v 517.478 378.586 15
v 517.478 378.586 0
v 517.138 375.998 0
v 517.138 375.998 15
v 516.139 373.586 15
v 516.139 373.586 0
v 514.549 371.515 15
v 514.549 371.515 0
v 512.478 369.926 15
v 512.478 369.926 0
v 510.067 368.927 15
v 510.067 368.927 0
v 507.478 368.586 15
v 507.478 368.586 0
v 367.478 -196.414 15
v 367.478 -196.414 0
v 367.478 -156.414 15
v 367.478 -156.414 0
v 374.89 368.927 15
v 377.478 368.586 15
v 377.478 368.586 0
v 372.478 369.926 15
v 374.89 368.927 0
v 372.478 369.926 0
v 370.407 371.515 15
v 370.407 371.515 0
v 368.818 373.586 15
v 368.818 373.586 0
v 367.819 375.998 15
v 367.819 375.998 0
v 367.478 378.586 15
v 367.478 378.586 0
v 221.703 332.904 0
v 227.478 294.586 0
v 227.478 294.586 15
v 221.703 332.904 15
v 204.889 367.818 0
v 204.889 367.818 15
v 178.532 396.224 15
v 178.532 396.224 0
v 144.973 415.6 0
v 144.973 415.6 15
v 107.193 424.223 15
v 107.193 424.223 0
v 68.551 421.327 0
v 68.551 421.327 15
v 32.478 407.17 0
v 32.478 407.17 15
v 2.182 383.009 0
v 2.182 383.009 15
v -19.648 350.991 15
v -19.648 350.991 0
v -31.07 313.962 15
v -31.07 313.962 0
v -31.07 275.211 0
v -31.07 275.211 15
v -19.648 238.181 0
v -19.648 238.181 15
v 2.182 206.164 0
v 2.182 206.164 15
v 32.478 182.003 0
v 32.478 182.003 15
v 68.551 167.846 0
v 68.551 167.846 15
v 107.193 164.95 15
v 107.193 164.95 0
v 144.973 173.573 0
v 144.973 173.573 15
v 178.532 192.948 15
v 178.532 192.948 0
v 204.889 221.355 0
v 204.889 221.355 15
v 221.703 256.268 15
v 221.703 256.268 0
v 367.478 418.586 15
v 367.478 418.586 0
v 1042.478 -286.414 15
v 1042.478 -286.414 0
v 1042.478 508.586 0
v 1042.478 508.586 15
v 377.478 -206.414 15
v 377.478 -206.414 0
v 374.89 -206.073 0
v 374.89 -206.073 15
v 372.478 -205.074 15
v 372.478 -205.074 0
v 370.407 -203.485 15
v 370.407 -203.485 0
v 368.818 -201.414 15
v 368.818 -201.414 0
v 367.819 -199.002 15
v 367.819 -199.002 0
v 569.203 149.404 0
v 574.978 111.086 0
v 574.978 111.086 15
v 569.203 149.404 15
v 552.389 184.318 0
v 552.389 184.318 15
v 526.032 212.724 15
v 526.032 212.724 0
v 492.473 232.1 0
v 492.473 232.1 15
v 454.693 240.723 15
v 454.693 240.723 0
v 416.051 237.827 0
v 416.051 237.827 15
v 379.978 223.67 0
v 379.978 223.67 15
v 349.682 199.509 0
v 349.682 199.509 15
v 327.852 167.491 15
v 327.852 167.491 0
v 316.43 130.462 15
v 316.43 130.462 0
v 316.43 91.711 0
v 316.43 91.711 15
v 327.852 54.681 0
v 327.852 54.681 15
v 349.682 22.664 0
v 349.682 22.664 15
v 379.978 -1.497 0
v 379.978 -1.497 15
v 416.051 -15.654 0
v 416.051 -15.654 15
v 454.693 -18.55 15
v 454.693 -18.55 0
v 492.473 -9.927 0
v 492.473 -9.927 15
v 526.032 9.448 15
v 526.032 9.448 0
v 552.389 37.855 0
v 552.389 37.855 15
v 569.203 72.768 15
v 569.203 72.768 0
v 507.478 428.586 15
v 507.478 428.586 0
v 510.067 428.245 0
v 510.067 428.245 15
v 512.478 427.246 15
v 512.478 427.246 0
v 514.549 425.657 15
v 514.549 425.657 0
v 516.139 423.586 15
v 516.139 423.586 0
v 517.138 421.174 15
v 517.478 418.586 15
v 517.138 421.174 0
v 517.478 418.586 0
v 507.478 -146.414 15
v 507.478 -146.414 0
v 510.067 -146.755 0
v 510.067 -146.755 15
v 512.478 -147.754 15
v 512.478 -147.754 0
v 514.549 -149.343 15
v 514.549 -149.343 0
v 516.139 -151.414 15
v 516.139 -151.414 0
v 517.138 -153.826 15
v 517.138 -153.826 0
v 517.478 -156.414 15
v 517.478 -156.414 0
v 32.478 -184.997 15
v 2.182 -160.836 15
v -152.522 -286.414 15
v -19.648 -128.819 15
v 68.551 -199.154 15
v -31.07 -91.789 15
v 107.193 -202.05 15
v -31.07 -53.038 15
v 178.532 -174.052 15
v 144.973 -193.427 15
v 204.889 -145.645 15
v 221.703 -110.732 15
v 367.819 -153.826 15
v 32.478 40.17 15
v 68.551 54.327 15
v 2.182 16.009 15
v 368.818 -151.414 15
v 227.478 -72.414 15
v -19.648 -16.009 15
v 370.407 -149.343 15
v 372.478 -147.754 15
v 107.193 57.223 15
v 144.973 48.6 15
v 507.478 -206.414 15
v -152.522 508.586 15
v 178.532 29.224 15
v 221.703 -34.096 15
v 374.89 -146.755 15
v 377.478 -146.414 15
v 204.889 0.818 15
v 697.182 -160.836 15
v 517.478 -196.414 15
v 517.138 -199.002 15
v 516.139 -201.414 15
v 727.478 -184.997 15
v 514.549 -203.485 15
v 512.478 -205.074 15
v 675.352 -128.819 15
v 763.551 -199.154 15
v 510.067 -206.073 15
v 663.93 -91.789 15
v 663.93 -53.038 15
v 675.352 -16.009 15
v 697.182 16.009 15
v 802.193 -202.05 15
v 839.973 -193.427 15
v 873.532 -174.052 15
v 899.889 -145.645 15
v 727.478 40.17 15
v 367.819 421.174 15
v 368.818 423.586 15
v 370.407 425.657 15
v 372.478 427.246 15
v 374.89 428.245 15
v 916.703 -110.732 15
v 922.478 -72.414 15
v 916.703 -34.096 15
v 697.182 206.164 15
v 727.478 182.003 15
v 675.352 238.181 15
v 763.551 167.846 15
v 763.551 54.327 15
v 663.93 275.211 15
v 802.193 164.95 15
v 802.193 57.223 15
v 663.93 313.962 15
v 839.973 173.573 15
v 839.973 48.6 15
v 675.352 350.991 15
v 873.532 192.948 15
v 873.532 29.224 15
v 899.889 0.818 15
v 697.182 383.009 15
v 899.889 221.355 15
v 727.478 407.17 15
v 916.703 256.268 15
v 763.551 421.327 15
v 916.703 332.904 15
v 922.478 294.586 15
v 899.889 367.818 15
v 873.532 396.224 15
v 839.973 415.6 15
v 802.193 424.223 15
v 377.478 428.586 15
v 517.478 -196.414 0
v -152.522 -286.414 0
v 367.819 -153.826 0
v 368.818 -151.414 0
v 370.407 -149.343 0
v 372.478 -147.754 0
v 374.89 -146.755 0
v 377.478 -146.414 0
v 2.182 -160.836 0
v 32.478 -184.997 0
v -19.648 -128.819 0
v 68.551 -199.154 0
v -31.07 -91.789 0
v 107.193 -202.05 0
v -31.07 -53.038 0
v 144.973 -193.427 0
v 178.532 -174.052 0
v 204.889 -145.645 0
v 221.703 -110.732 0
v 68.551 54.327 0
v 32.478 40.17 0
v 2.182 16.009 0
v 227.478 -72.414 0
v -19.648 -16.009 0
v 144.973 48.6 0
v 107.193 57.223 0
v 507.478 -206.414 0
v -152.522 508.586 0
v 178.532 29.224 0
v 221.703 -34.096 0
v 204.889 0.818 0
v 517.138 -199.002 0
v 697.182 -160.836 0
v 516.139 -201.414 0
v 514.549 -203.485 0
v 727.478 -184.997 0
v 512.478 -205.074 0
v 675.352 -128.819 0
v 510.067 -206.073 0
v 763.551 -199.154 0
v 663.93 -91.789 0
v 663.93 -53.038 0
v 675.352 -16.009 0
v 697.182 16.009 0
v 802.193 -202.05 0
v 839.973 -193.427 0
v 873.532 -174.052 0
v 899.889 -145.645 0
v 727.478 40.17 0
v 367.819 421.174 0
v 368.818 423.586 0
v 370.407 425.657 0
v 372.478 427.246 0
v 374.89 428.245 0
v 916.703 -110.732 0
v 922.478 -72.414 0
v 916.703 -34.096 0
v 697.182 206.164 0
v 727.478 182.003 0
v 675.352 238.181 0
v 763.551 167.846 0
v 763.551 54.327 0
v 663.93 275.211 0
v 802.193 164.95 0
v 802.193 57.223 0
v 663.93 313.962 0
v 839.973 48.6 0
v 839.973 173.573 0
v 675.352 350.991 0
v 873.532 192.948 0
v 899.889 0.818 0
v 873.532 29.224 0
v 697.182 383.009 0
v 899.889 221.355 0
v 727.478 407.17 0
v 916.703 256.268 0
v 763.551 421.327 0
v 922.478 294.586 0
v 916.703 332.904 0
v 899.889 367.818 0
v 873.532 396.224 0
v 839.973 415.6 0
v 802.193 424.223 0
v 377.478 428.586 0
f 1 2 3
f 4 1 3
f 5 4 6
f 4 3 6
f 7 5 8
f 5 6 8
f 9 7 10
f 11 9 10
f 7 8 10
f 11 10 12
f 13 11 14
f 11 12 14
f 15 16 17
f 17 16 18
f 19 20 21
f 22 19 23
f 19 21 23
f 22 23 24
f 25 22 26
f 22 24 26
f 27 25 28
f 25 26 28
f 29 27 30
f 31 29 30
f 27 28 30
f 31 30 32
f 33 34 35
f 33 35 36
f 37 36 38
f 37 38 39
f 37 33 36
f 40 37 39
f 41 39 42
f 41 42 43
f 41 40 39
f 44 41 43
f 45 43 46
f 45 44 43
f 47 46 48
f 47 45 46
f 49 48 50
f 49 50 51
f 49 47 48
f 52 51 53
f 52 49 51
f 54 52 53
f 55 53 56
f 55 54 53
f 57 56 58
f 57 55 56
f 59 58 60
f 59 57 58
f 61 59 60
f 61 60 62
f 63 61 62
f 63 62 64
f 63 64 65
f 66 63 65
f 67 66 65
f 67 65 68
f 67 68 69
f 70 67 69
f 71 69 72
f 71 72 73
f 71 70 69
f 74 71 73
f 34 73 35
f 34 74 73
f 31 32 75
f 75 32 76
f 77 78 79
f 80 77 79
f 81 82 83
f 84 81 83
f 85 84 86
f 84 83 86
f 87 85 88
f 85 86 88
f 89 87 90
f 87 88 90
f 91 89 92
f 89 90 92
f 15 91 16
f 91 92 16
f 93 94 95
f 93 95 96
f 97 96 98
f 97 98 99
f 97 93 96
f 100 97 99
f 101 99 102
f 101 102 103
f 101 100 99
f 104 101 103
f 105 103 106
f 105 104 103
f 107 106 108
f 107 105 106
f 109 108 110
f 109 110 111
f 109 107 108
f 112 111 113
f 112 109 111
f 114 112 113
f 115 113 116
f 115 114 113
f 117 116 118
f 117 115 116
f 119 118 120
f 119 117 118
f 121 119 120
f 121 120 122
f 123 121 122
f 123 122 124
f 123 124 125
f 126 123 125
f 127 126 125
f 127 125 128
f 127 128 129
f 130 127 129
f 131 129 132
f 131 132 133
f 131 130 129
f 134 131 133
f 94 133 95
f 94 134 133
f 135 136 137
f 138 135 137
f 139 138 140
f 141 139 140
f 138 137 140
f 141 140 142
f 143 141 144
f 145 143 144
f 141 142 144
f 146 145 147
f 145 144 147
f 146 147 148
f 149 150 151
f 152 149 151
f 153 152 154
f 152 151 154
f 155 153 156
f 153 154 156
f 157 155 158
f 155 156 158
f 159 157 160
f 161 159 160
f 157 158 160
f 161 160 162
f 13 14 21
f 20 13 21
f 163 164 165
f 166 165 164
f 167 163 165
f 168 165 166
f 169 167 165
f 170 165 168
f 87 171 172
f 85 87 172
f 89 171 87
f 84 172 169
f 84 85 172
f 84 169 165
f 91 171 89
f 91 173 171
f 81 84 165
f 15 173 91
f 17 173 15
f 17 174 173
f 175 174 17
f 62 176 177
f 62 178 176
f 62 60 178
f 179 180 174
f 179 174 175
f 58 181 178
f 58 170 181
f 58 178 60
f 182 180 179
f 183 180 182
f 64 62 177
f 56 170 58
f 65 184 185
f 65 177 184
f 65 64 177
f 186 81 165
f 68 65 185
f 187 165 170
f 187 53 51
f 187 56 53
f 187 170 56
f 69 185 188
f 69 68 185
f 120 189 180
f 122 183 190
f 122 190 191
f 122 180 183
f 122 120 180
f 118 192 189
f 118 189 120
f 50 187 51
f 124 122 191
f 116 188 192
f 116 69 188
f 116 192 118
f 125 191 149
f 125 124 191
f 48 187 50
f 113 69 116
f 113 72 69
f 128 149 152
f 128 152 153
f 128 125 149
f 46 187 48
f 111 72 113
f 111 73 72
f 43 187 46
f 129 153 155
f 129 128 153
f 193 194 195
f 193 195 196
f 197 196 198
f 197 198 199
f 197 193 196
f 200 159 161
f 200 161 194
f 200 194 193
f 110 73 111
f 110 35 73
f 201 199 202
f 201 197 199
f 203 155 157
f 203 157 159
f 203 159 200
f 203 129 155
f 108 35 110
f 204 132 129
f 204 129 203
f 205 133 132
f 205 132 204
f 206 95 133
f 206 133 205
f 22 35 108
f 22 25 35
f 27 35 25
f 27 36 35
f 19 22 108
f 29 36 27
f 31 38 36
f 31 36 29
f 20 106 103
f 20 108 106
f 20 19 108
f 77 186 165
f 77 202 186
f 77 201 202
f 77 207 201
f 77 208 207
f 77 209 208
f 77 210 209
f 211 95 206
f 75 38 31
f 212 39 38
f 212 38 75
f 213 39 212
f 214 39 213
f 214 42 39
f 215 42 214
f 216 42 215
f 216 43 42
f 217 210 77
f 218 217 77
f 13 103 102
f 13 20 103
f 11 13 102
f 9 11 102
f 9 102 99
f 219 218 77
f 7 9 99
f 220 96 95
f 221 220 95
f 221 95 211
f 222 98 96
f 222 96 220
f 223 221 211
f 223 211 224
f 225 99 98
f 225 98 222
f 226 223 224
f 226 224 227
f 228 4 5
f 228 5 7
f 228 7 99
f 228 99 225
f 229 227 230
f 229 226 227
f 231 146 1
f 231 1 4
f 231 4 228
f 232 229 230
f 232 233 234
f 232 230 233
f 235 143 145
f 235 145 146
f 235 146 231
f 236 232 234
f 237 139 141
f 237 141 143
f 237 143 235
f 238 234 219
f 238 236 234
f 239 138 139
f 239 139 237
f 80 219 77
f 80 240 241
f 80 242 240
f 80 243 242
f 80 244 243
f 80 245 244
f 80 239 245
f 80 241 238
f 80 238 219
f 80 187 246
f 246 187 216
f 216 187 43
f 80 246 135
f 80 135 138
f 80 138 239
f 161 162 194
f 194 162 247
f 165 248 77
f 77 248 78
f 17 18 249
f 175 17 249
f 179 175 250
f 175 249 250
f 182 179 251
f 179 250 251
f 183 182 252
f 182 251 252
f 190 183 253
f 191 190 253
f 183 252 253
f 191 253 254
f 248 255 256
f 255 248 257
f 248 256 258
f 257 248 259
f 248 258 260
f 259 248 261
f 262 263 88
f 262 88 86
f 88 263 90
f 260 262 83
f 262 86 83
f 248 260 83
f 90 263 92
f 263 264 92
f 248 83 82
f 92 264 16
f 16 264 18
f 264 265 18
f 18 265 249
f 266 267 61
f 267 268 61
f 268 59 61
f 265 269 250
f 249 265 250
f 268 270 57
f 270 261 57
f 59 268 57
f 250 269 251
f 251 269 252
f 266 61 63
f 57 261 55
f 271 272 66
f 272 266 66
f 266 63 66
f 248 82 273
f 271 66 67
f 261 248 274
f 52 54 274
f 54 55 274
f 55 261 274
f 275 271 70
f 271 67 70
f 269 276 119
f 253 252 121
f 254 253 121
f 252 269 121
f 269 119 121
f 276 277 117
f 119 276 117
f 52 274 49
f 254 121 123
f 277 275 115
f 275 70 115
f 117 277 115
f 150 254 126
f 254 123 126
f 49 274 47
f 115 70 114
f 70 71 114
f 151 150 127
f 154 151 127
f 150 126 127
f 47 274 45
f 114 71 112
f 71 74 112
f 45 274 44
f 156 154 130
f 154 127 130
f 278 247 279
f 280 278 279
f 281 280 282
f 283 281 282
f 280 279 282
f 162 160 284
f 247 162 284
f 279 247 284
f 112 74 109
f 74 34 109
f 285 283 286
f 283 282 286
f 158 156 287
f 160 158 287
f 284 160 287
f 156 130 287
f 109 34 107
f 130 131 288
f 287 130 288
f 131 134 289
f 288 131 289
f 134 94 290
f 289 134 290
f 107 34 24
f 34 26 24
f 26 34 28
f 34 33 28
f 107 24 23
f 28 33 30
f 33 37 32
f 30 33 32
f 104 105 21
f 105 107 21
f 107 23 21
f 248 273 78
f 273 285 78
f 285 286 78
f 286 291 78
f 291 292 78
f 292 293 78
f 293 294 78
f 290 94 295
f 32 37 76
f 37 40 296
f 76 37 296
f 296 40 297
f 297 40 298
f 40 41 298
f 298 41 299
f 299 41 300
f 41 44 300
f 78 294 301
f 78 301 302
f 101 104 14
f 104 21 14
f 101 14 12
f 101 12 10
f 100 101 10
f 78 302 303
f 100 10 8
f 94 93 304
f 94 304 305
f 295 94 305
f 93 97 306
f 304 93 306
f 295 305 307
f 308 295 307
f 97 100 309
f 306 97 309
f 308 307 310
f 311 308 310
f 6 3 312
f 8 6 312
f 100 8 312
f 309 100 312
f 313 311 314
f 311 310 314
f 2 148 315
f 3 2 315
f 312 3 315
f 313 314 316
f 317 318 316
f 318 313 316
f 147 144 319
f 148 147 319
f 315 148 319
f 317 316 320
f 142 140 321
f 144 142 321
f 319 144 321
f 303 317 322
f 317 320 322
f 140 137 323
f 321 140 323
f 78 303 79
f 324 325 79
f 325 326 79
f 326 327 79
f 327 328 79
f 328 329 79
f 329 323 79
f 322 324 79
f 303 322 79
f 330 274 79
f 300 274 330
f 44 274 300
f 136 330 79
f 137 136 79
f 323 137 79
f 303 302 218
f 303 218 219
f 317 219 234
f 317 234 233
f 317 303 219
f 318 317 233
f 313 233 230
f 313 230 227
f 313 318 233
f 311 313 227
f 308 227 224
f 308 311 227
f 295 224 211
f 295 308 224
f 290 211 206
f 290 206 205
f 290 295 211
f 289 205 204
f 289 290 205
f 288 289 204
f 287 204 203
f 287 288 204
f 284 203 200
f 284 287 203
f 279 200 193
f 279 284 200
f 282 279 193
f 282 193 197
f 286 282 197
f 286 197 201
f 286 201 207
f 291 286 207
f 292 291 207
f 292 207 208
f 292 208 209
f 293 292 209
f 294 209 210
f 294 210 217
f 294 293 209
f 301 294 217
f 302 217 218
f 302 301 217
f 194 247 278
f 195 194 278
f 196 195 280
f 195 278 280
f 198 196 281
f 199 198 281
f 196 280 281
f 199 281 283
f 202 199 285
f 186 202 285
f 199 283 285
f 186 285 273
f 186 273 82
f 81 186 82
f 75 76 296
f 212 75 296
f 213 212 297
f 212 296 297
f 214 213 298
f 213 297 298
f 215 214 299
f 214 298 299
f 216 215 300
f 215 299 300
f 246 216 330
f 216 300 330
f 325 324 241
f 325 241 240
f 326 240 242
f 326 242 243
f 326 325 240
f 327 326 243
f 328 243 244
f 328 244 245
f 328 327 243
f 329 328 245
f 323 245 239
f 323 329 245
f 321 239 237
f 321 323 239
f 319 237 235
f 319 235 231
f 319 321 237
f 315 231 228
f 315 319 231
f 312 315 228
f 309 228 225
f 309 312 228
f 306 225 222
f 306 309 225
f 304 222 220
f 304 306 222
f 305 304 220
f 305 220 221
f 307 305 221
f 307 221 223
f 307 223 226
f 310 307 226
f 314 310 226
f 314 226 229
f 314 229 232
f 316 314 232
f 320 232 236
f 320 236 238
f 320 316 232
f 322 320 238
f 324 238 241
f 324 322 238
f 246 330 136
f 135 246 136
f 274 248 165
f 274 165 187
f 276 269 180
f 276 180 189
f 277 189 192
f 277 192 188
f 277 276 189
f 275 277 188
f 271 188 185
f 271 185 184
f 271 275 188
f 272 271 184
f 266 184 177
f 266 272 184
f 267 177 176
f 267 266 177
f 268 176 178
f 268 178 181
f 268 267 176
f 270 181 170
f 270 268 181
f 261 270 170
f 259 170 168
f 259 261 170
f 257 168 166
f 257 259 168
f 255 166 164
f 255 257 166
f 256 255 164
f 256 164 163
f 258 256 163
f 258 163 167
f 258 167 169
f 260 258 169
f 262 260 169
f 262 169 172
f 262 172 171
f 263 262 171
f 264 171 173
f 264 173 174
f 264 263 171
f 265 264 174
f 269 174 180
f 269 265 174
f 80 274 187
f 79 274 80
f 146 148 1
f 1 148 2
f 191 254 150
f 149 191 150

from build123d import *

# Parameters (mm, degrees)
F0_W     = 1195
F0_H     = 795
F0_R     = 130
F1_DEPTH = 15


with BuildPart() as f1:
    # F0 (on Top) → F1 (new body)
    with BuildSketch(Plane.XY):
        with Locations((444.978323, 111.086236)):
            Rectangle(F0_W, F0_H)
        with BuildLine():
            ThreePointArc((367.478323, -156.413764), (370.407255, -149.342696), (377.478323, -146.413764))
            Line((377.478323, -146.413764), (507.478323, -146.413764))
            ThreePointArc((507.478323, -146.413764), (514.549391, -149.342696), (517.478323, -156.413764))
            Line((517.478323, -156.413764), (517.478323, -196.413764))
            ThreePointArc((517.478323, -196.413764), (514.549391, -203.484832), (507.478323, -206.413764))
            Line((507.478323, -206.413764), (377.478323, -206.413764))
            ThreePointArc((377.478323, -206.413764), (370.407255, -203.484832), (367.478323, -196.413764))
            Line((367.478323, -196.413764), (367.478323, -156.413764))
        make_face(mode=Mode.SUBTRACT)
        with Locations((97.478323, -72.413764)):
            Circle(F0_R, mode=Mode.SUBTRACT)
        with Locations((444.978323, 111.086236)):
            Circle(F0_R, mode=Mode.SUBTRACT)
        with Locations((792.478323, -72.413764)):
            Circle(F0_R, mode=Mode.SUBTRACT)
        with Locations((97.478323, 294.586236)):
            Circle(F0_R, mode=Mode.SUBTRACT)
        with BuildLine():
            ThreePointArc((367.478323, 418.586236), (370.407255, 425.657304), (377.478323, 428.586236))
            Line((377.478323, 428.586236), (507.478323, 428.586236))
            ThreePointArc((507.478323, 428.586236), (514.549391, 425.657304), (517.478323, 418.586236))
            Line((517.478323, 418.586236), (517.478323, 378.586236))
            ThreePointArc((517.478323, 378.586236), (514.549391, 371.515168), (507.478323, 368.586236))
            Line((507.478323, 368.586236), (377.478323, 368.586236))
            ThreePointArc((377.478323, 368.586236), (370.407255, 371.515168), (367.478323, 378.586236))
            Line((367.478323, 378.586236), (367.478323, 418.586236))
        make_face(mode=Mode.SUBTRACT)
        with Locations((792.478323, 294.586236)):
            Circle(F0_R, mode=Mode.SUBTRACT)
    extrude(amount=F1_DEPTH)


solid = f1.part
